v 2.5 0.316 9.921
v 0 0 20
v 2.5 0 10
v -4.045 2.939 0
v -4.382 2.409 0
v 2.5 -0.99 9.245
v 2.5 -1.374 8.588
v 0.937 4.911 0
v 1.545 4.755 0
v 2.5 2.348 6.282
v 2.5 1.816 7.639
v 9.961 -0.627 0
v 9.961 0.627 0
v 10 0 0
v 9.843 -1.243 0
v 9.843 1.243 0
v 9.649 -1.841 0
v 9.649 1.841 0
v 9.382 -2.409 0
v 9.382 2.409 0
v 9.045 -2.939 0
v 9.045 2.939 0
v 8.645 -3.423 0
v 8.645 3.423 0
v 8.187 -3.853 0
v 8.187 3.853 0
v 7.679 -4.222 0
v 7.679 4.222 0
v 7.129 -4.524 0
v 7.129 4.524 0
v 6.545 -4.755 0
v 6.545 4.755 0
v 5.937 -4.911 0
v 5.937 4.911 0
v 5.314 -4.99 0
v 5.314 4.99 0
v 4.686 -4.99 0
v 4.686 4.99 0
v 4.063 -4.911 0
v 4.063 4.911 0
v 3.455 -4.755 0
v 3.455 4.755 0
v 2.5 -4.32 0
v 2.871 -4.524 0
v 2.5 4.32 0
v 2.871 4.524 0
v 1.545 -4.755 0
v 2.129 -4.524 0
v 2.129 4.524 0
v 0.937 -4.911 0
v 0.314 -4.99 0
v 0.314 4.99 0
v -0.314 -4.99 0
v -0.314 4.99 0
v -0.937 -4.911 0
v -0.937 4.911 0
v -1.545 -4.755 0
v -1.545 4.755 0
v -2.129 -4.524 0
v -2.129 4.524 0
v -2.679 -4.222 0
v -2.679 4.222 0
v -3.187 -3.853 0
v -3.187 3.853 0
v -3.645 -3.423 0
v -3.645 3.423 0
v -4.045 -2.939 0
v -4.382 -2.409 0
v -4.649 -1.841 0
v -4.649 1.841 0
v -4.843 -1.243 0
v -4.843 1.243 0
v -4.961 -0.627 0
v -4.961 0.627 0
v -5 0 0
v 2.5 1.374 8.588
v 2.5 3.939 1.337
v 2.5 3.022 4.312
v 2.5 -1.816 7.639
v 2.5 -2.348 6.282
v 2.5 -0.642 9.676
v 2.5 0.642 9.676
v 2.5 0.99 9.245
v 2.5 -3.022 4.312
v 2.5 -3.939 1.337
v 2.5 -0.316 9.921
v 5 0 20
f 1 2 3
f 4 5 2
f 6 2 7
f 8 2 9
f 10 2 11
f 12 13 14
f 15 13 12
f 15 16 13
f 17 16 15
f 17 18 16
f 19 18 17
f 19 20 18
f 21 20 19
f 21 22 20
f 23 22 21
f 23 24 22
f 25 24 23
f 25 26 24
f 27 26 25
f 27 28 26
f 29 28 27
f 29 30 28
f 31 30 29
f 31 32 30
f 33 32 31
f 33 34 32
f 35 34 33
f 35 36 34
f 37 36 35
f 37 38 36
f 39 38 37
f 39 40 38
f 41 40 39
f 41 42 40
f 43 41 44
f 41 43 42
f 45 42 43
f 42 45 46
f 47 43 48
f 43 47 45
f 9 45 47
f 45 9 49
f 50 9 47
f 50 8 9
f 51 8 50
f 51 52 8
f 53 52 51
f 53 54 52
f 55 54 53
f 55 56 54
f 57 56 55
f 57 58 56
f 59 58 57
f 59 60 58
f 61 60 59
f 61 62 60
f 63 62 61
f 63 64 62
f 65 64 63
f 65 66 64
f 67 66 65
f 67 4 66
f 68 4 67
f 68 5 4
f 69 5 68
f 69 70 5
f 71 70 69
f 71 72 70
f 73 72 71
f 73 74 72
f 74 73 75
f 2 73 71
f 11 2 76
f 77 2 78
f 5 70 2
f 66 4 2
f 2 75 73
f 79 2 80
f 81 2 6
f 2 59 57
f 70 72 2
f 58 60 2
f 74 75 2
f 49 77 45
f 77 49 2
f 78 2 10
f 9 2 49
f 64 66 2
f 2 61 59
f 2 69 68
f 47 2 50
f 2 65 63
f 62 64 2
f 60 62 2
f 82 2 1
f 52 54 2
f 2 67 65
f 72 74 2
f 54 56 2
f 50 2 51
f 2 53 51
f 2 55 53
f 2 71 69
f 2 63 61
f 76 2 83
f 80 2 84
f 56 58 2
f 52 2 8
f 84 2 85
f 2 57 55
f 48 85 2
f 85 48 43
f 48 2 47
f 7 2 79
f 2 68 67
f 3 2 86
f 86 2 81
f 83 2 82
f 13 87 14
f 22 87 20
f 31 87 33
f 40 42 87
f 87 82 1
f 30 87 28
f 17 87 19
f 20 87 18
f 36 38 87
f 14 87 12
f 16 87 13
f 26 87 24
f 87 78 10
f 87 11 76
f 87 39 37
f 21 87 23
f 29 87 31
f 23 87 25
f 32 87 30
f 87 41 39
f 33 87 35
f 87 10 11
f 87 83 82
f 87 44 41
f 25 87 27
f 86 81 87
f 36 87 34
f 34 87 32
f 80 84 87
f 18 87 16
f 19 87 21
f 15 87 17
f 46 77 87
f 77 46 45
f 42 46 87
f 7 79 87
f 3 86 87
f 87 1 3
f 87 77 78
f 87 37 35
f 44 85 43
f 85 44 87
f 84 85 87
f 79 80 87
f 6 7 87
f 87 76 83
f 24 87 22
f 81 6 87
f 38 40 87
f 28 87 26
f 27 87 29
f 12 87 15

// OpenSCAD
$fn=50;
union() {
    cylinder(h=20, r1=5, r2=0);
    translate([5, 0, 0]) cylinder(h=20, r1=5, r2=0);
}
